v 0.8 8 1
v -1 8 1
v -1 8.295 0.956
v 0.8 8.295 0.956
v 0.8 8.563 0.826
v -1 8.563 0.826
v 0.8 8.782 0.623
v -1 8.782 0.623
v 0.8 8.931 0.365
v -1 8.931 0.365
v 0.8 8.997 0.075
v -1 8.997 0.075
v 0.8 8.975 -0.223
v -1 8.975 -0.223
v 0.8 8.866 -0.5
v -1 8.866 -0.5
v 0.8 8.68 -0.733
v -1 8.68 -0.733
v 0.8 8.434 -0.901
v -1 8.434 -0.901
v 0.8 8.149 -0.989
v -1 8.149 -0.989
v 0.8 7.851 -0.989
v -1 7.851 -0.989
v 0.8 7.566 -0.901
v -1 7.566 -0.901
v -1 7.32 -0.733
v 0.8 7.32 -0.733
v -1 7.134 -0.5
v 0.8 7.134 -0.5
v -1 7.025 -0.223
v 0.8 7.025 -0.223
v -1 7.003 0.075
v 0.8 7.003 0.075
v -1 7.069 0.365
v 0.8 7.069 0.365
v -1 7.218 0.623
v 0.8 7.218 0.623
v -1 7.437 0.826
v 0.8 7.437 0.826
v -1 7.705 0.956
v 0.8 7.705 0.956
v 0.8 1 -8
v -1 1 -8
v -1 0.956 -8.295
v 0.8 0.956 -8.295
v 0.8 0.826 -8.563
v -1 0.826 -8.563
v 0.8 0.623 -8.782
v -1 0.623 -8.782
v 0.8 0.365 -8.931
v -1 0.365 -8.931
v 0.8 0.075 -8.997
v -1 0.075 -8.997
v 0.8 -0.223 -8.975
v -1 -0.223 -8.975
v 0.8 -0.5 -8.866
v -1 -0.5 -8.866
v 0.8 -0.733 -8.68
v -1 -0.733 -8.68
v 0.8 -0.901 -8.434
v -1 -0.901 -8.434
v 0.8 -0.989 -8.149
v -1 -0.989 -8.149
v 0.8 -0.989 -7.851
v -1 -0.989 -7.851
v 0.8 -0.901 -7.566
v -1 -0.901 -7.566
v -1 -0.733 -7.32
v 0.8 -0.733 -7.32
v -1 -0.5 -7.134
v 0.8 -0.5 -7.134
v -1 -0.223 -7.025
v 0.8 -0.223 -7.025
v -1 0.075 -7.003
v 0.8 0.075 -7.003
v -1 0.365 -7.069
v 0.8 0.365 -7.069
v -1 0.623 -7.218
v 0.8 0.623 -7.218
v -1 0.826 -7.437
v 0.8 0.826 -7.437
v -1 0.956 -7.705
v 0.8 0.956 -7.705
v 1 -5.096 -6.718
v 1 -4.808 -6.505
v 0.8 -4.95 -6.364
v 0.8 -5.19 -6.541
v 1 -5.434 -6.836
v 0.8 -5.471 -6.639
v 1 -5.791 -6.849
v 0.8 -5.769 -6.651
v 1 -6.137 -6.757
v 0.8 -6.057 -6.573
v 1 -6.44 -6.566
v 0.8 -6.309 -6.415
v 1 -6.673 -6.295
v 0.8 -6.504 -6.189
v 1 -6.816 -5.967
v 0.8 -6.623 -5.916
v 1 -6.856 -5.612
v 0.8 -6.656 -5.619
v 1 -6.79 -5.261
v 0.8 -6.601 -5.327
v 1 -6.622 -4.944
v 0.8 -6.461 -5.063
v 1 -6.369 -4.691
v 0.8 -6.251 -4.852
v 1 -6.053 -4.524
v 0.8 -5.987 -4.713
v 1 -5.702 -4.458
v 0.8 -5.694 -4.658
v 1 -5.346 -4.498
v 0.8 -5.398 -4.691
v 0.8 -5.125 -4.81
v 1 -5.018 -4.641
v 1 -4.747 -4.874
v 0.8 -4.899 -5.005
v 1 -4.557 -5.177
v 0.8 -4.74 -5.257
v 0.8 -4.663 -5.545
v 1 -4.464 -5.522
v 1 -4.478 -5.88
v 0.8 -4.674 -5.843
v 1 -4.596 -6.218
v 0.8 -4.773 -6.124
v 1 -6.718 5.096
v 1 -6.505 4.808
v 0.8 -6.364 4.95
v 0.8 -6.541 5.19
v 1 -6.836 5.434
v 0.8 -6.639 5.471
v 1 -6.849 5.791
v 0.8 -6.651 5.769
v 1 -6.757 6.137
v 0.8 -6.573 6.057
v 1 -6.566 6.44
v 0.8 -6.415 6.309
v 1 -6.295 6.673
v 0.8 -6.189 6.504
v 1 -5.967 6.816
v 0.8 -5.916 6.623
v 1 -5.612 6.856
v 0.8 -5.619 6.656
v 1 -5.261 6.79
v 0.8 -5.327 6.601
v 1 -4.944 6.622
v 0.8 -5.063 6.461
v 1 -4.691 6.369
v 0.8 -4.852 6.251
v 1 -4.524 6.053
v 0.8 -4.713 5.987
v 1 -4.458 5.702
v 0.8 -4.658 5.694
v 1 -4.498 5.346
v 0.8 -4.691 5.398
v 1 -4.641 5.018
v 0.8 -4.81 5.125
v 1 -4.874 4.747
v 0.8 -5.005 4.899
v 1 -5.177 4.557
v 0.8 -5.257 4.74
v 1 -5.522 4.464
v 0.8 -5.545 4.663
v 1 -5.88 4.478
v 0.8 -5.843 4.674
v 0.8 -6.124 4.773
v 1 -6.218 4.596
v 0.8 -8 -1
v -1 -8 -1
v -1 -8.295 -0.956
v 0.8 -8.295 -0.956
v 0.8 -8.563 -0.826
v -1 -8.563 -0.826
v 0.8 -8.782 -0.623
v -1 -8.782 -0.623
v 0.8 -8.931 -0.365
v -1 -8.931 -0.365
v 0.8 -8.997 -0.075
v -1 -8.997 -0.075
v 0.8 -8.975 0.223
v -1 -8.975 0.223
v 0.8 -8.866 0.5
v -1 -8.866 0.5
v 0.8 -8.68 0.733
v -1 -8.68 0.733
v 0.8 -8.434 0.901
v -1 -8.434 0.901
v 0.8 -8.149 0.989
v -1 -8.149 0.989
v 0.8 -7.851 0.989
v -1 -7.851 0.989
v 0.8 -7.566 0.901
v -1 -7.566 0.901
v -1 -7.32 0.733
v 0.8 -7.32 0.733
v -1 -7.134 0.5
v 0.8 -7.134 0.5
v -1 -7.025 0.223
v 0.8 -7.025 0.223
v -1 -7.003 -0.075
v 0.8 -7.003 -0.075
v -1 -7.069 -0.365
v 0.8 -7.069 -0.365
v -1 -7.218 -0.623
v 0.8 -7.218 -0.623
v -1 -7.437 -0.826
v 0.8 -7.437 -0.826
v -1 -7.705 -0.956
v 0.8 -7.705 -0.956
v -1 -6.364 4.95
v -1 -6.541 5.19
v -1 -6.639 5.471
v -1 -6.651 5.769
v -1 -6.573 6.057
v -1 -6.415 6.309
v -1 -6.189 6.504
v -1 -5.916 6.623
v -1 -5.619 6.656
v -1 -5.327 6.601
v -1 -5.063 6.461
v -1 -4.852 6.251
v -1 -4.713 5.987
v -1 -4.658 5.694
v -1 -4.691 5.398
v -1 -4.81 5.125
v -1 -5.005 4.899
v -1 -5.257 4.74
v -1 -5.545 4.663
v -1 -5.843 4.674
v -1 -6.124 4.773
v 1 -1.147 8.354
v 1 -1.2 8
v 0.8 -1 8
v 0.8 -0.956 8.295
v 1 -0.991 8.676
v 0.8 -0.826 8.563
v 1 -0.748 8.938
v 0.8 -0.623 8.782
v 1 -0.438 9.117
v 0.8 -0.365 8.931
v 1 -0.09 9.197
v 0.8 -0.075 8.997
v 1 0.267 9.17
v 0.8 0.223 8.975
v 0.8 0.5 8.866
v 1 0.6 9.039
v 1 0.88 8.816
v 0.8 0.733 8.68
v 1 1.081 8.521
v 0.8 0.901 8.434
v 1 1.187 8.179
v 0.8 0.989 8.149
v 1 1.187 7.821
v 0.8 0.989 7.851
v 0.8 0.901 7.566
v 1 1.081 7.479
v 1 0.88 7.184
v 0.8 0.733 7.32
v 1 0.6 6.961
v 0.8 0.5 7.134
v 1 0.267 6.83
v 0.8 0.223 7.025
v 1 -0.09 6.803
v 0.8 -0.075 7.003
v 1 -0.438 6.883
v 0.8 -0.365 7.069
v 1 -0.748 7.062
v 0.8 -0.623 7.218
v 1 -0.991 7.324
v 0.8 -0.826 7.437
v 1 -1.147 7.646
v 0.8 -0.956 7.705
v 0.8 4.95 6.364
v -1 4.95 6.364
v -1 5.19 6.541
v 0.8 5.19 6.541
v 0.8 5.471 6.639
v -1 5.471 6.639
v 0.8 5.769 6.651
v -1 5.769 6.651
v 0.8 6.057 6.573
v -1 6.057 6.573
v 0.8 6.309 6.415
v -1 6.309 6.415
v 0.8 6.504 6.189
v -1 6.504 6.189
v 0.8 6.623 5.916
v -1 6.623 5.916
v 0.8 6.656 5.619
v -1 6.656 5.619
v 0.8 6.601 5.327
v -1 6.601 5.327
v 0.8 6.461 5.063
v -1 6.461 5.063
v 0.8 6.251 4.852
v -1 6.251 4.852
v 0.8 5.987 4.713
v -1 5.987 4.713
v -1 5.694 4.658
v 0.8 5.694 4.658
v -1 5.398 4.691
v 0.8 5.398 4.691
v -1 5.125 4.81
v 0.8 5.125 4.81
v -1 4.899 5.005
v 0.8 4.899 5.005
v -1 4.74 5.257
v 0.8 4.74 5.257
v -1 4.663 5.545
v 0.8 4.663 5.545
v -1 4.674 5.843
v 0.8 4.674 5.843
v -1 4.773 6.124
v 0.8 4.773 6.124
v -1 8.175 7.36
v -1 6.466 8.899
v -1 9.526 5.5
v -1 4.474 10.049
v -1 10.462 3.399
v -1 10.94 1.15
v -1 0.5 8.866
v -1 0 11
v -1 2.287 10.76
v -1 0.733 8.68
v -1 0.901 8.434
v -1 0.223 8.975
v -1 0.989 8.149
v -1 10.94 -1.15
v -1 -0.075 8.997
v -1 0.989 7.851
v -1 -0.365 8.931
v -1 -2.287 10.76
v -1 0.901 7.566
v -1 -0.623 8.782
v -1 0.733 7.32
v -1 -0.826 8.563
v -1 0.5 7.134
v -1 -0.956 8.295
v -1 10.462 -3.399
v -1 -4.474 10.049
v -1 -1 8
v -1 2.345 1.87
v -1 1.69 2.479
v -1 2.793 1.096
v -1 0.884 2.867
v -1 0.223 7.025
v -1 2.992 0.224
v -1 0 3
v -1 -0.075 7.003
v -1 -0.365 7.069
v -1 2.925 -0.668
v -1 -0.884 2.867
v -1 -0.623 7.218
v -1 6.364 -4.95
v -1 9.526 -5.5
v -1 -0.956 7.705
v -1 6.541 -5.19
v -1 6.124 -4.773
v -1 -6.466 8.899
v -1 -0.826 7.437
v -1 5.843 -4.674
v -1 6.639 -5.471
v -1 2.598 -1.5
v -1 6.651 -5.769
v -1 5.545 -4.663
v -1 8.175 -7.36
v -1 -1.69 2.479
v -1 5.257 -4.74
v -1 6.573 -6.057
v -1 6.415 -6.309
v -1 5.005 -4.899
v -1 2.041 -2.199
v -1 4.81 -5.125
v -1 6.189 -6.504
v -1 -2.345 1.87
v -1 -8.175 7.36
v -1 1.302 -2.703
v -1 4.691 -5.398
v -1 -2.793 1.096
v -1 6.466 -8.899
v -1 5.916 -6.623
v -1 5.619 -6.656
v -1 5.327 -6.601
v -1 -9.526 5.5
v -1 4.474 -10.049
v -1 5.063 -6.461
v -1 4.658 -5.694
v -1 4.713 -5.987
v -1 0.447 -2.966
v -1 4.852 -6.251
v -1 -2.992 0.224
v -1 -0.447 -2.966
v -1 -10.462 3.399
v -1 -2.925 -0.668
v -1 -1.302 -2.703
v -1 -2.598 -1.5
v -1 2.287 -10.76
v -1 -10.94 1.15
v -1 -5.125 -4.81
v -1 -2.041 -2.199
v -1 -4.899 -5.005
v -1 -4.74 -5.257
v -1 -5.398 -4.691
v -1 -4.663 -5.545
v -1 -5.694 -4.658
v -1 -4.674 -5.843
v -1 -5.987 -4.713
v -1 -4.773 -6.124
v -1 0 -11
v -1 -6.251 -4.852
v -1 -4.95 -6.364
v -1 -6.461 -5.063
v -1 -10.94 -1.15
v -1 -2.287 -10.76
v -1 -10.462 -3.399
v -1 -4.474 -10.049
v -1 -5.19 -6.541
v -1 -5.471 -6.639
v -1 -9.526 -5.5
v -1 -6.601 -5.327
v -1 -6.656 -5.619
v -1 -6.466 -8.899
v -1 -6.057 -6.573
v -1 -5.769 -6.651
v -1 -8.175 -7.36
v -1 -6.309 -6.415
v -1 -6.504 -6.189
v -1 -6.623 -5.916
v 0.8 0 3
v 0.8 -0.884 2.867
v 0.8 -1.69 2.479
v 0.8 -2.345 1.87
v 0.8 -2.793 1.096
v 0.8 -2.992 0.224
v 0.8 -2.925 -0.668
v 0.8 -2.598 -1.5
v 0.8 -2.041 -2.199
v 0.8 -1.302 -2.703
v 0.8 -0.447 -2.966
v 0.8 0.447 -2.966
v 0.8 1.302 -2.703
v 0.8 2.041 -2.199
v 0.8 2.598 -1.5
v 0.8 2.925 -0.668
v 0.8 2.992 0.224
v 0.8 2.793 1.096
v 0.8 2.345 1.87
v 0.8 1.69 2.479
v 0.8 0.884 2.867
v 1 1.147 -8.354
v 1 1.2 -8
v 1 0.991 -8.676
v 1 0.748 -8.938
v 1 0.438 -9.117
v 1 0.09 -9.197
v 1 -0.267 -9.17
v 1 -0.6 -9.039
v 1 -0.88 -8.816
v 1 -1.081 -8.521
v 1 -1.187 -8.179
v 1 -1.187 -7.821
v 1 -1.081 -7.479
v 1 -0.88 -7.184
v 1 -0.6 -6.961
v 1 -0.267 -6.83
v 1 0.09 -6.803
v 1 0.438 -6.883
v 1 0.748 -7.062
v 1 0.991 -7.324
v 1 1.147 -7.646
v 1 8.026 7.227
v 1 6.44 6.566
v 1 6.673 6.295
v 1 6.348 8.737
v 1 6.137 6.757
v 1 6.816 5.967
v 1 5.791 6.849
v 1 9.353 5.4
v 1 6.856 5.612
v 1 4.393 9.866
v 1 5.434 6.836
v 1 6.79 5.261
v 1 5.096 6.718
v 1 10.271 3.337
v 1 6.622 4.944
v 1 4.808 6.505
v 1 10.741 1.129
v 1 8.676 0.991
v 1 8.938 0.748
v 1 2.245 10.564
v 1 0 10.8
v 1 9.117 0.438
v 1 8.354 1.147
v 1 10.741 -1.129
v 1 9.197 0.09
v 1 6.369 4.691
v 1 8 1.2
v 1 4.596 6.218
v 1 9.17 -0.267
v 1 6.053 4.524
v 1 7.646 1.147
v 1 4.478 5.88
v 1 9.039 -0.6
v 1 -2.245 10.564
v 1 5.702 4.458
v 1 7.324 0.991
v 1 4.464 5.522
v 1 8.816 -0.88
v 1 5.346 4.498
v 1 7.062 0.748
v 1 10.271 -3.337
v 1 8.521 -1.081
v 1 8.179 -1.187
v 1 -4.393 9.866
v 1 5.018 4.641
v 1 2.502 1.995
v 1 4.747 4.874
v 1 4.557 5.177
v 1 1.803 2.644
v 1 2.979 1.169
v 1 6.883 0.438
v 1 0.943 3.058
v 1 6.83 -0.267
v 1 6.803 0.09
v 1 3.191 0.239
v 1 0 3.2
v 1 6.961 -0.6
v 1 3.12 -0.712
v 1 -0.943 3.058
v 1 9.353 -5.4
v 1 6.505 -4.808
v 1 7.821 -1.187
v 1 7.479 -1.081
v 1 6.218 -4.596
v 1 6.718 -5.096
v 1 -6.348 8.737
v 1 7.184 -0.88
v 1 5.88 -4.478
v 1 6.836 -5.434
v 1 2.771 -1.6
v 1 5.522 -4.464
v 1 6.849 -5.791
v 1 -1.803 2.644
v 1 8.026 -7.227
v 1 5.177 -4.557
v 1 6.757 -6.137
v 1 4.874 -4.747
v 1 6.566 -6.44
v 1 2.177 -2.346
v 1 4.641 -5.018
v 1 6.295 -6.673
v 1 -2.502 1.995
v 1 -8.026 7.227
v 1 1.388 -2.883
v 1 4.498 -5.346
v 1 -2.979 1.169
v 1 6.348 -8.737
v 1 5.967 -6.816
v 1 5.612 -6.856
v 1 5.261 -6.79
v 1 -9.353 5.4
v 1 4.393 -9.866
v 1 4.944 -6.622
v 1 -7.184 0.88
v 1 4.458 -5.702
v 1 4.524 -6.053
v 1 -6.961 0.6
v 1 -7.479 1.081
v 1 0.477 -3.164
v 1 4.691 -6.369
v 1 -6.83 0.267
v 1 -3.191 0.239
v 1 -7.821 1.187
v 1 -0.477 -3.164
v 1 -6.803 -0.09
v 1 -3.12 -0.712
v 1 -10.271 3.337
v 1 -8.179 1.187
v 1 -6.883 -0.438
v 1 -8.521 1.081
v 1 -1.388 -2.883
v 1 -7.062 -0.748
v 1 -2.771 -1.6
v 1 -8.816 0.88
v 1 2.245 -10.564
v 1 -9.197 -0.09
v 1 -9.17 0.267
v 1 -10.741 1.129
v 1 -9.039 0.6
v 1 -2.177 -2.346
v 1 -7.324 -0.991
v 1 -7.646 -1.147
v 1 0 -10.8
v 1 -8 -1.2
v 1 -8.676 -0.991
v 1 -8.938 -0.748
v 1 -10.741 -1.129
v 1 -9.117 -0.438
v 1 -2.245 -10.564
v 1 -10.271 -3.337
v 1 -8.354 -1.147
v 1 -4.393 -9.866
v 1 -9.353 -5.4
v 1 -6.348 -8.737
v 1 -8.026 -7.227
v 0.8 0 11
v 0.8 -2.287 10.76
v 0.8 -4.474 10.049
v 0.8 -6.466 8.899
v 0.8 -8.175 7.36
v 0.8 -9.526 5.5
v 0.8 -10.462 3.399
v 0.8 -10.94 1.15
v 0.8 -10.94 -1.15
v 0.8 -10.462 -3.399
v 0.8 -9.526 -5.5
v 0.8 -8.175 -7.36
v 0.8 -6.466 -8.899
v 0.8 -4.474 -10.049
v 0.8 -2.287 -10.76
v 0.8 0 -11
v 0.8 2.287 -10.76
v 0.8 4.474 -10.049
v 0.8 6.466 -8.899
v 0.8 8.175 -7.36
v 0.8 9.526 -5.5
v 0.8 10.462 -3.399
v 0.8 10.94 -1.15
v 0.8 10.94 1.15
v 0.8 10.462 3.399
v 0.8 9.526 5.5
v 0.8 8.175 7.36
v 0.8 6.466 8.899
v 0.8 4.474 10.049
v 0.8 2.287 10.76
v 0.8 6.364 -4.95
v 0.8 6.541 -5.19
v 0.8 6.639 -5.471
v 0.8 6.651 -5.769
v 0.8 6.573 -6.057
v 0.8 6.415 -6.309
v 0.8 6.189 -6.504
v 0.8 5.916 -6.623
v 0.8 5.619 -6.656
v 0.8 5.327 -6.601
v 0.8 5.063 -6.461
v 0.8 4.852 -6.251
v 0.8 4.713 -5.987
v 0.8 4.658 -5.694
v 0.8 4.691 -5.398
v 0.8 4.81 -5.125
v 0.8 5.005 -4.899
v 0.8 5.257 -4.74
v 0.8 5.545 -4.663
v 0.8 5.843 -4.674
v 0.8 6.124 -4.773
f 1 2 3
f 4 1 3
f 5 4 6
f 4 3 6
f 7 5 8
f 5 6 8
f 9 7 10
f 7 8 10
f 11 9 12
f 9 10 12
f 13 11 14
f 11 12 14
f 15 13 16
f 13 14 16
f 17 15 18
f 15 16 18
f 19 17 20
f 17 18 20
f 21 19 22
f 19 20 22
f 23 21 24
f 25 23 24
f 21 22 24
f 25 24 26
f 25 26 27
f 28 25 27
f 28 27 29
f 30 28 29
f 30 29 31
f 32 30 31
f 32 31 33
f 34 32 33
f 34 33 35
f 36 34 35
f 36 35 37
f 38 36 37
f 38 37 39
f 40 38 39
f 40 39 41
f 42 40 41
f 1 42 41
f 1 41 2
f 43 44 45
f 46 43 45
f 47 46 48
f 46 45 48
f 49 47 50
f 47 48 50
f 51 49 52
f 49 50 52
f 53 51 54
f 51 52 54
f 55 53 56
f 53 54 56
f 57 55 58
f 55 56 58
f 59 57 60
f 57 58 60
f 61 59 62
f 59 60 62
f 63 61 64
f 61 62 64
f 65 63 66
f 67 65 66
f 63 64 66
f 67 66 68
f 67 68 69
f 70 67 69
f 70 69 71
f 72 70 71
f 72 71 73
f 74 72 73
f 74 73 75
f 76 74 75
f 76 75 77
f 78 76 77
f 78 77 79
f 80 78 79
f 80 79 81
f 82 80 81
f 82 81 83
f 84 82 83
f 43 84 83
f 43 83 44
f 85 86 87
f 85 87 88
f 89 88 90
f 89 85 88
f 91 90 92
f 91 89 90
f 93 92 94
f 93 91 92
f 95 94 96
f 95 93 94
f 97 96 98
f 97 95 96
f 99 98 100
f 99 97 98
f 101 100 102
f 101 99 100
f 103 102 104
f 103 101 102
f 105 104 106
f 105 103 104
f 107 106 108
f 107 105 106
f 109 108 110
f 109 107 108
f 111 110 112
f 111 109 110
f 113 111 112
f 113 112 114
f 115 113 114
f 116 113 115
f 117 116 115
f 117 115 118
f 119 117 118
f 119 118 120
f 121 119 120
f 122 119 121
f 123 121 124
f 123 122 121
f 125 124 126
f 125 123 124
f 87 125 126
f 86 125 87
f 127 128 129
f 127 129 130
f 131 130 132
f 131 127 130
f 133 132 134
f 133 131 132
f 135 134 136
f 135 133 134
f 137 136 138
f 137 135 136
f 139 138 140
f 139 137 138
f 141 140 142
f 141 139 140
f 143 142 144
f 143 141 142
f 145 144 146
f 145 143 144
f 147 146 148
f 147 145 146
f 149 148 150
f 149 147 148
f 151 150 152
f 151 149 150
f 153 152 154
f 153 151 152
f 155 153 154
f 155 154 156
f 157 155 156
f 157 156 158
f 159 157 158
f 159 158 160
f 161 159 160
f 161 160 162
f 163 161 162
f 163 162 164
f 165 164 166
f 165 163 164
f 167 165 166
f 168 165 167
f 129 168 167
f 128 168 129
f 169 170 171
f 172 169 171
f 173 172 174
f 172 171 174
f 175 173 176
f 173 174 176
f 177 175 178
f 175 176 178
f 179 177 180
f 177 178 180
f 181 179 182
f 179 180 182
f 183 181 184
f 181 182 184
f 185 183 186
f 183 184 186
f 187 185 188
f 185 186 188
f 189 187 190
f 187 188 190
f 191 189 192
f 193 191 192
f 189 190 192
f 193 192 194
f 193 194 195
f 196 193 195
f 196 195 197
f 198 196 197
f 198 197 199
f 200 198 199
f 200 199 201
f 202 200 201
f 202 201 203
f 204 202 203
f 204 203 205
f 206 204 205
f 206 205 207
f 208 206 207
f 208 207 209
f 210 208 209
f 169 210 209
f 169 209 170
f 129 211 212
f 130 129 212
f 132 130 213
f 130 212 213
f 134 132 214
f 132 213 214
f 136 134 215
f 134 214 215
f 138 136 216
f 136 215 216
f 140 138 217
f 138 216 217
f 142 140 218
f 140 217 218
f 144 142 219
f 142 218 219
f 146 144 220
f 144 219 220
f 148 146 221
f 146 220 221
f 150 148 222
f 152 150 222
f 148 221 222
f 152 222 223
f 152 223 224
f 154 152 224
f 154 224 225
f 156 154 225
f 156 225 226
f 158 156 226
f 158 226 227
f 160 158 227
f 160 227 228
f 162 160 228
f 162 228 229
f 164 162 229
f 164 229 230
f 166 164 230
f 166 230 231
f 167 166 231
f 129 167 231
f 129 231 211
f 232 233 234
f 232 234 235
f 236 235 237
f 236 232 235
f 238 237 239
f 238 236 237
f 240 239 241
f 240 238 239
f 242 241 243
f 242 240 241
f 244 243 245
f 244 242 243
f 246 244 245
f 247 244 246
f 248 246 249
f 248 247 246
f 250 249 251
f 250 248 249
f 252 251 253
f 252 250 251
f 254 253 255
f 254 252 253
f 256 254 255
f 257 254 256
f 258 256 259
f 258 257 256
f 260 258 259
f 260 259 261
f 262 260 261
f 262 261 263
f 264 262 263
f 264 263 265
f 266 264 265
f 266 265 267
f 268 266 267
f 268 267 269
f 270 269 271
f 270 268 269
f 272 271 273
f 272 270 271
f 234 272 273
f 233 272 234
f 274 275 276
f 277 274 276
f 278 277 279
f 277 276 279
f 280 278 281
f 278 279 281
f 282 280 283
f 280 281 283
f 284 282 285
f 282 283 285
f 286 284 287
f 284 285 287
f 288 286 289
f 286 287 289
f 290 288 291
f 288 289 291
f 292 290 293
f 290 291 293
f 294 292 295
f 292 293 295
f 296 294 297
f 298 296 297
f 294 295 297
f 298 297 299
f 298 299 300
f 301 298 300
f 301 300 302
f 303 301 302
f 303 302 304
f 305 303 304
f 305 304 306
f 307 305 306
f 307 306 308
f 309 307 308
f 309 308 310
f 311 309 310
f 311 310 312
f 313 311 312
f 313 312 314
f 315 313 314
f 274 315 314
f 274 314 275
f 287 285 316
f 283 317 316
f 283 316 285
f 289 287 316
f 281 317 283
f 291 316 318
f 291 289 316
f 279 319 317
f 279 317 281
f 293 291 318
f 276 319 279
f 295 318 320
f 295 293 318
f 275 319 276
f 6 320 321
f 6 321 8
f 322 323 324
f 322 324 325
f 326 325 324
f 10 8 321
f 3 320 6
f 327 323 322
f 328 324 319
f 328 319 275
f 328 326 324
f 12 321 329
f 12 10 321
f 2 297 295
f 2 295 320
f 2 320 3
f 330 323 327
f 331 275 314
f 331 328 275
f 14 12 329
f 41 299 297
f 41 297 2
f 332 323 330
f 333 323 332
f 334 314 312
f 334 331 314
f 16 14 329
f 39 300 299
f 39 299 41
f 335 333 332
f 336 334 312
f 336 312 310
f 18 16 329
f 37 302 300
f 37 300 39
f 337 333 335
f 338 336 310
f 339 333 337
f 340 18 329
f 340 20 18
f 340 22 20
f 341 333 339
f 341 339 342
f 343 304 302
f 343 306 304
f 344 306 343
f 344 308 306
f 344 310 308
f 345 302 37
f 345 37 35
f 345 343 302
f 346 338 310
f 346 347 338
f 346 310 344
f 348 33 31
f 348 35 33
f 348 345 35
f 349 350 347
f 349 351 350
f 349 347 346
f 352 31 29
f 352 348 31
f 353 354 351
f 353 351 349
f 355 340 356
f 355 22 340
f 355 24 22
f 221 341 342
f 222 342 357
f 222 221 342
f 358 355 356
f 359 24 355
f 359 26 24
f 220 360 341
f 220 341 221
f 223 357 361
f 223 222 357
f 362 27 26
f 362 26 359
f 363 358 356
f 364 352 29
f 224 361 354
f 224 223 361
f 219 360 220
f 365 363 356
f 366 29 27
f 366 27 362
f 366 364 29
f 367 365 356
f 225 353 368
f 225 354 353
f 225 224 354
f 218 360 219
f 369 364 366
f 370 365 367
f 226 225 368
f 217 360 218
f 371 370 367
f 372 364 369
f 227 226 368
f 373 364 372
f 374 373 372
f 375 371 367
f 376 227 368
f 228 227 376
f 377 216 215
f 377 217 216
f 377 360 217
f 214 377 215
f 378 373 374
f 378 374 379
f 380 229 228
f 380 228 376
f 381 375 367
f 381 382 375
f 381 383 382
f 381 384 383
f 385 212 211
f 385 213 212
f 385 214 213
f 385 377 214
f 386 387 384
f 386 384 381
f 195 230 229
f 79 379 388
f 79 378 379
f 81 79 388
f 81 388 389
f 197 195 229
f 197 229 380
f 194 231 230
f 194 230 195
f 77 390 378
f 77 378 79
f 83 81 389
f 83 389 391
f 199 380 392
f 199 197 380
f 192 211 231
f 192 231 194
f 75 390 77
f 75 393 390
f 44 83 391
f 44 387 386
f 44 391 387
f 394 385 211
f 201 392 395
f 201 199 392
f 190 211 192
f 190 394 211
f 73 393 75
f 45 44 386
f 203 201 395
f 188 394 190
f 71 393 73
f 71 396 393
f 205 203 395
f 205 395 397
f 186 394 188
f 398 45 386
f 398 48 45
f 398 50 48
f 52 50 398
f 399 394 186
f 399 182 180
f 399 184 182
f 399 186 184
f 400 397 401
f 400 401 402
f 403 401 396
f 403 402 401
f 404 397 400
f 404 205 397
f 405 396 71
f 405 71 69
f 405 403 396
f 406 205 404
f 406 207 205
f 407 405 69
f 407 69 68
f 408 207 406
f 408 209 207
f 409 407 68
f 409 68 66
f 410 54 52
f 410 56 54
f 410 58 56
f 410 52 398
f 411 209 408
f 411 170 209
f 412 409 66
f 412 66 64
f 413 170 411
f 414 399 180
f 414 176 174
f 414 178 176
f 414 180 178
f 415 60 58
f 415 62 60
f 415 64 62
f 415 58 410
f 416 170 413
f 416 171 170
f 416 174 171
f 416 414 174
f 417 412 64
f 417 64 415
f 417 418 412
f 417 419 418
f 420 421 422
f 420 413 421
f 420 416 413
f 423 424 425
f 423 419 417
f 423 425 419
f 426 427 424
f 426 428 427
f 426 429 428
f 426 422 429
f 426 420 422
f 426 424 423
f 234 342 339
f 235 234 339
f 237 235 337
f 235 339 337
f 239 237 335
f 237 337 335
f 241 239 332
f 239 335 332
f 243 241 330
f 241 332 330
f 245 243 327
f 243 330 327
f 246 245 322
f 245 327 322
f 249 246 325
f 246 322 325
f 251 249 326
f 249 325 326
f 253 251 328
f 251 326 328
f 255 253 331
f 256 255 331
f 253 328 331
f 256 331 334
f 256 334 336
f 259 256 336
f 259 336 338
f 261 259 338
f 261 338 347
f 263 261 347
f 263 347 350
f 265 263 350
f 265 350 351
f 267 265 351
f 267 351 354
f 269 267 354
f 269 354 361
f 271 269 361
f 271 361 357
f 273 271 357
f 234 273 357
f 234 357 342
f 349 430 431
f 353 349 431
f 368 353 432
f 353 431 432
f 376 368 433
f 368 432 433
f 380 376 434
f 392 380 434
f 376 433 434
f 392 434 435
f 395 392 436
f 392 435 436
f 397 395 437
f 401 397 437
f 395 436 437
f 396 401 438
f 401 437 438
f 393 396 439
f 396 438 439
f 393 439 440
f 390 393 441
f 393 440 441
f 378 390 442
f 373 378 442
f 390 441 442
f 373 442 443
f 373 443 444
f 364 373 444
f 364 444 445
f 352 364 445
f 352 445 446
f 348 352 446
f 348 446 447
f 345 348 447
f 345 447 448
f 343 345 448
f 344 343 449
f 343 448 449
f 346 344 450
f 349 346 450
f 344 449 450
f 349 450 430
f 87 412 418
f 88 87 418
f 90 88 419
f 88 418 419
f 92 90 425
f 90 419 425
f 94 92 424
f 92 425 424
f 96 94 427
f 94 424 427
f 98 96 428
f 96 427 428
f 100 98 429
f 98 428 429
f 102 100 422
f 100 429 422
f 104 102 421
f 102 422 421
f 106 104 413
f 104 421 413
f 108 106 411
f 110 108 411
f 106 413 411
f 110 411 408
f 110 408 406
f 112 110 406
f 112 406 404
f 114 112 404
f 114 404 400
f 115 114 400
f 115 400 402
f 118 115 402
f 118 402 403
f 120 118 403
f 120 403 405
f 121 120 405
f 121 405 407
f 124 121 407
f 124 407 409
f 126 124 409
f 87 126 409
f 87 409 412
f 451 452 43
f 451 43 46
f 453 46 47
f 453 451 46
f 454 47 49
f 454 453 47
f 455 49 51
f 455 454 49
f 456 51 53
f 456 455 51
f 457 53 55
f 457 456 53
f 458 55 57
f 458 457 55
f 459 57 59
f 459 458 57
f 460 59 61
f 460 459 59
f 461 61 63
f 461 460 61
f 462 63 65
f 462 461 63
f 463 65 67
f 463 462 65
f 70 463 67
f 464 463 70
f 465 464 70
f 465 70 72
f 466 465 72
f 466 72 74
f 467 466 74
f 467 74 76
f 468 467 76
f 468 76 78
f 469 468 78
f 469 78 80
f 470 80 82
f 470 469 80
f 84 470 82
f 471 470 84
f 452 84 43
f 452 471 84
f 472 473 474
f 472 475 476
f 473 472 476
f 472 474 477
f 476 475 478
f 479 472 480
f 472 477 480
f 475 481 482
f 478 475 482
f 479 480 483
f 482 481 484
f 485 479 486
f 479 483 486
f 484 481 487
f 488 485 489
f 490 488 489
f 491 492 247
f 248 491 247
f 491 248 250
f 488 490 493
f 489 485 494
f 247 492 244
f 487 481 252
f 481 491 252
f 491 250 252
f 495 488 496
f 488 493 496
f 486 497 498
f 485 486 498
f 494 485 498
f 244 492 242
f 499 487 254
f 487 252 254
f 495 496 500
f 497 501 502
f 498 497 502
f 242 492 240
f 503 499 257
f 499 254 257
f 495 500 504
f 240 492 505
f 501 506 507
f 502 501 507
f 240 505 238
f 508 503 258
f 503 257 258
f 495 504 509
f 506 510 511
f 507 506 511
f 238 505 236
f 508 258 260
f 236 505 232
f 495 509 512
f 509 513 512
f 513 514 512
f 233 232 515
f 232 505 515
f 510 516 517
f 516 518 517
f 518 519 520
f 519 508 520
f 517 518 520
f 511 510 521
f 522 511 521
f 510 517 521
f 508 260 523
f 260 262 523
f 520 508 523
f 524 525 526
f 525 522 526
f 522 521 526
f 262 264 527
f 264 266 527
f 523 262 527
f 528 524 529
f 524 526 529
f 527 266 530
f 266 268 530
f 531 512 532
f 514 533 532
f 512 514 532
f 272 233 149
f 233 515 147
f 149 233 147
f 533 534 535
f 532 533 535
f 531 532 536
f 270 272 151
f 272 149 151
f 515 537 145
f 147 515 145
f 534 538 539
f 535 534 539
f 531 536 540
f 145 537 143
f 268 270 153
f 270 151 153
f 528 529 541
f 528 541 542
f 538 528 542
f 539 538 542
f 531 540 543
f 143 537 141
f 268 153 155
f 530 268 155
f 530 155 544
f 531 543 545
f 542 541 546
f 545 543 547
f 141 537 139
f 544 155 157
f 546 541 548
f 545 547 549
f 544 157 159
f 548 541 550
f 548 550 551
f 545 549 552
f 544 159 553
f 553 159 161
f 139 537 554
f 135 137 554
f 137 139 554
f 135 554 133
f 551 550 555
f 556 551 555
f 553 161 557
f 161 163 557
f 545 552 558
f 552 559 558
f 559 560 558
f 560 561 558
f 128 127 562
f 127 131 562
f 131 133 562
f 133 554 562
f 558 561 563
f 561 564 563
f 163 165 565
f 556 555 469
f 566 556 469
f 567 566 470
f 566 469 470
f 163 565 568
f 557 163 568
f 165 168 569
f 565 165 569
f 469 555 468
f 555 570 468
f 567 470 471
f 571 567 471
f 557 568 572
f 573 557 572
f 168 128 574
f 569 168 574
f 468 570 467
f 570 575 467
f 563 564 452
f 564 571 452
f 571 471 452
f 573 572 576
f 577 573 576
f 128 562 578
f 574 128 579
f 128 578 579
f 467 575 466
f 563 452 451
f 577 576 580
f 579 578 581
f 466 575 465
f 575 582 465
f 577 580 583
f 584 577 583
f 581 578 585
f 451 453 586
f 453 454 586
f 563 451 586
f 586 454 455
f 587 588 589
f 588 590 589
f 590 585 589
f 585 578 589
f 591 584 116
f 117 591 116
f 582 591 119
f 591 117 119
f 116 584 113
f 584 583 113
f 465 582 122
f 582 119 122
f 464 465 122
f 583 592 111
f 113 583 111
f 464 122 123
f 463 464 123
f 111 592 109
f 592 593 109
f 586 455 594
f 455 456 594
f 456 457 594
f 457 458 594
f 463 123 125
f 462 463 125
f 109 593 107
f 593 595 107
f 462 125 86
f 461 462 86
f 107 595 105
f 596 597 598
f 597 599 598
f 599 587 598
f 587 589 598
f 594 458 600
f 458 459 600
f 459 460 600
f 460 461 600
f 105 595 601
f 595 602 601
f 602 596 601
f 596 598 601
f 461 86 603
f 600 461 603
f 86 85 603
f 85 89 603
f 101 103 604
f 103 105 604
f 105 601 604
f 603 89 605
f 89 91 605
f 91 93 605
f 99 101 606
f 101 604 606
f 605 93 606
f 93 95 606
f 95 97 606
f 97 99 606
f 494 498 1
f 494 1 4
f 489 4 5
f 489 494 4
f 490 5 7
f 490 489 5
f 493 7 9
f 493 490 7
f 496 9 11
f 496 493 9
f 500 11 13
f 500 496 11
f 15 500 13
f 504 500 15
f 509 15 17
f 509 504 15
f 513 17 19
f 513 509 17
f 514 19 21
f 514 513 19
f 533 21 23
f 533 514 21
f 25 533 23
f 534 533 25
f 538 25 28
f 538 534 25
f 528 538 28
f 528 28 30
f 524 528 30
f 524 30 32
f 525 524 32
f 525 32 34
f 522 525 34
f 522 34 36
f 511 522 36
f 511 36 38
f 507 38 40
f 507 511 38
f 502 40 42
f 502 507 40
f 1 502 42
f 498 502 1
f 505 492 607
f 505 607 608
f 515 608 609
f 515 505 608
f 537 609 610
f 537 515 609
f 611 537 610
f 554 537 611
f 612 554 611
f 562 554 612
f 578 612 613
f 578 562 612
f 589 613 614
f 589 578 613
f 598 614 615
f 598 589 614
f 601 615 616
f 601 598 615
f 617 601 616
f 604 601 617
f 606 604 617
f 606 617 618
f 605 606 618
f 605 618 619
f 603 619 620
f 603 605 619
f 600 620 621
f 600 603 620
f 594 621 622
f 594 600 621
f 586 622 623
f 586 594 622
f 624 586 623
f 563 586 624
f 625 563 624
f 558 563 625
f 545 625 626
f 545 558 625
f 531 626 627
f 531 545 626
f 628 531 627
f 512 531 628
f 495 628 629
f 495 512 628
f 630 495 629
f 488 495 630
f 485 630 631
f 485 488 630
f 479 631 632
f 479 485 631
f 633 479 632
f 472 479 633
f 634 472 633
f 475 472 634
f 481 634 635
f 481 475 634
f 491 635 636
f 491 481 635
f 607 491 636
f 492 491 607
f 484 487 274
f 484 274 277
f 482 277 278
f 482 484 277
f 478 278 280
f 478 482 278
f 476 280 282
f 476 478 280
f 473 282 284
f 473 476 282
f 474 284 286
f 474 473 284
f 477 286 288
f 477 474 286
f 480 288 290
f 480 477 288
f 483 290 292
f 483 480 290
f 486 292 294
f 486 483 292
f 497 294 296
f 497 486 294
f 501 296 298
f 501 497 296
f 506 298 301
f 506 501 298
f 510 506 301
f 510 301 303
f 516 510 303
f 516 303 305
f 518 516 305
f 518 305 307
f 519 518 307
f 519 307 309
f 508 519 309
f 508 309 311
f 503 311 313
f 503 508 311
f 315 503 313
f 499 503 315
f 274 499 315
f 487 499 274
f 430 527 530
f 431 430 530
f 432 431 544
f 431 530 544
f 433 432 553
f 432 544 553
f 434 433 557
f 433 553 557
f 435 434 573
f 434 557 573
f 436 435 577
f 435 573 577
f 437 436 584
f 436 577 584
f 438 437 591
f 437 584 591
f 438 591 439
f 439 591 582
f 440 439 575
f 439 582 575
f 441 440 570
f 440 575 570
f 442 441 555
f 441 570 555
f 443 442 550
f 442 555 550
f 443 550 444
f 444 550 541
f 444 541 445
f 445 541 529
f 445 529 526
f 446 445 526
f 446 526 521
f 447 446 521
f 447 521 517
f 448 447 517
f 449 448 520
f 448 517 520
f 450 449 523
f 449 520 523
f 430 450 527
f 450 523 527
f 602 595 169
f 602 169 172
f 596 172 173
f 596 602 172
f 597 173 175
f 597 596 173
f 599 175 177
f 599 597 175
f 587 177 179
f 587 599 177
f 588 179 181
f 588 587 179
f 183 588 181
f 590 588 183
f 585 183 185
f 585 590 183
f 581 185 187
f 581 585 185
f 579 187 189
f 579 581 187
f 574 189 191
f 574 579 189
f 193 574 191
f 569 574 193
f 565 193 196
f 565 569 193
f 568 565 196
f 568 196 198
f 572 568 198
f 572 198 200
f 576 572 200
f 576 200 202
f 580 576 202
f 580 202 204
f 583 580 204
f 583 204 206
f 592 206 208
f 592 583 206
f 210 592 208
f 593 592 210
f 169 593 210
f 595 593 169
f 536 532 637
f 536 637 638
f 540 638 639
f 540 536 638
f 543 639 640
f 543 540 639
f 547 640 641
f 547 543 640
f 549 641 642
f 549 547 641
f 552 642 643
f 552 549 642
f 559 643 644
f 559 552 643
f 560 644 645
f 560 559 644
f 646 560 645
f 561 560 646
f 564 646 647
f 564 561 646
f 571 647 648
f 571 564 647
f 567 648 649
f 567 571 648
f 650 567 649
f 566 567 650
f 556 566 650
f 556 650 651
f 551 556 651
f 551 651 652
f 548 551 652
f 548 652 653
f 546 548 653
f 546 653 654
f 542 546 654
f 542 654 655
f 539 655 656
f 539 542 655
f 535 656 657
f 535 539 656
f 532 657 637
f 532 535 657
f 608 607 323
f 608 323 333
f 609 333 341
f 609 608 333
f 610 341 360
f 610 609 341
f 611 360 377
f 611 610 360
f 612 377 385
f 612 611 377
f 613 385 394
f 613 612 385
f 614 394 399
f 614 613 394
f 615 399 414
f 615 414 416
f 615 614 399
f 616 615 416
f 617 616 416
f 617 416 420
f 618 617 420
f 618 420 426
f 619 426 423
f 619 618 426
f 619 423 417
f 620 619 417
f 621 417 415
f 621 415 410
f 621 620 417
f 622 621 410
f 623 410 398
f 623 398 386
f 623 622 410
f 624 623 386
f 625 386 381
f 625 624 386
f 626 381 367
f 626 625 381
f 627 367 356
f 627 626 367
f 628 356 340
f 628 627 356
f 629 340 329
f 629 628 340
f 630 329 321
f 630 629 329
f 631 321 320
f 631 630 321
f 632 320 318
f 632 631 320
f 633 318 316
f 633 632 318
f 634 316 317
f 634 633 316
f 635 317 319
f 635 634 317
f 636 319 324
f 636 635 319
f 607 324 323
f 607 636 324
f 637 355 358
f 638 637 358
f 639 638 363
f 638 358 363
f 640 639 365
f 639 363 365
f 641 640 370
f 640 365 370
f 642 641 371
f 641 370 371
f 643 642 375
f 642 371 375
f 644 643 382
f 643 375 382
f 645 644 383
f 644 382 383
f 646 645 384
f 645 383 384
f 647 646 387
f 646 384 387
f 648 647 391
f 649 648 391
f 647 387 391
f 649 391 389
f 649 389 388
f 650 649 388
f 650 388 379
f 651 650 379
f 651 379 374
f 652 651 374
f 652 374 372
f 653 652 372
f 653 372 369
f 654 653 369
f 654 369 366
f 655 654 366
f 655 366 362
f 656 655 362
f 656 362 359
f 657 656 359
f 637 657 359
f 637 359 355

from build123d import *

# Parameters (mm, degrees)
SKETCH2_W          = 2
SKETCH2_H          = 8
SKETCH3_R          = 1
CUT_EXTRUDE1_DEPTH = 16.684387141
CIRPATTERN1_COUNT  = 8
CHAMFER1_SIZE      = 0.2


with BuildPart() as part:
    # Sketch2 → Revolve1 (revolve)
    with BuildSketch(Plane.XY, mode=Mode.PRIVATE) as revolve1_sk:
        with Locations((0, 7)):
            Rectangle(SKETCH2_W, SKETCH2_H)
    revolve(revolve1_sk.sketch.rotate(Axis((0, 0, 0), (1, 0, 0)), 90), axis=Axis((0, 0, 0), (1, 0, 0)))

    # Sketch3 → Cut-Extrude1 (cut, through all)
    with BuildSketch(Plane.ZY.offset(1)):
        with Locations((0, 8)):
            Circle(SKETCH3_R)
    cut_extrude1 = extrude(amount=-CUT_EXTRUDE1_DEPTH, mode=Mode.SUBTRACT)

    # CirPattern1: Cut-Extrude1 ×8 about axis
    cirpattern1_axis = Axis((0, 0, 0), (1, 0, 0))
    for i in range(1, CIRPATTERN1_COUNT):
        add(cut_extrude1.rotate(cirpattern1_axis, i * 360 / CIRPATTERN1_COUNT), mode=Mode.SUBTRACT)

    # Chamfer1
    chamfer1_edges = [part.edges().sort_by_distance(p)[0] for p in [
        (1, 8, -1),
        (1, 4.949747468, -6.363961031),
        (1, -1, -8),
        (1, -6.363961031, -4.949747468),
        (1, -8, 1),
        (1, -4.949747468, 6.363961031),
        (1, 1, 8),
        (1, 0, -3),
        (1, 0, -11),
        (1, 6.363961031, 4.949747468),
    ]]
    chamfer(chamfer1_edges, length=CHAMFER1_SIZE)


solid = part.part
